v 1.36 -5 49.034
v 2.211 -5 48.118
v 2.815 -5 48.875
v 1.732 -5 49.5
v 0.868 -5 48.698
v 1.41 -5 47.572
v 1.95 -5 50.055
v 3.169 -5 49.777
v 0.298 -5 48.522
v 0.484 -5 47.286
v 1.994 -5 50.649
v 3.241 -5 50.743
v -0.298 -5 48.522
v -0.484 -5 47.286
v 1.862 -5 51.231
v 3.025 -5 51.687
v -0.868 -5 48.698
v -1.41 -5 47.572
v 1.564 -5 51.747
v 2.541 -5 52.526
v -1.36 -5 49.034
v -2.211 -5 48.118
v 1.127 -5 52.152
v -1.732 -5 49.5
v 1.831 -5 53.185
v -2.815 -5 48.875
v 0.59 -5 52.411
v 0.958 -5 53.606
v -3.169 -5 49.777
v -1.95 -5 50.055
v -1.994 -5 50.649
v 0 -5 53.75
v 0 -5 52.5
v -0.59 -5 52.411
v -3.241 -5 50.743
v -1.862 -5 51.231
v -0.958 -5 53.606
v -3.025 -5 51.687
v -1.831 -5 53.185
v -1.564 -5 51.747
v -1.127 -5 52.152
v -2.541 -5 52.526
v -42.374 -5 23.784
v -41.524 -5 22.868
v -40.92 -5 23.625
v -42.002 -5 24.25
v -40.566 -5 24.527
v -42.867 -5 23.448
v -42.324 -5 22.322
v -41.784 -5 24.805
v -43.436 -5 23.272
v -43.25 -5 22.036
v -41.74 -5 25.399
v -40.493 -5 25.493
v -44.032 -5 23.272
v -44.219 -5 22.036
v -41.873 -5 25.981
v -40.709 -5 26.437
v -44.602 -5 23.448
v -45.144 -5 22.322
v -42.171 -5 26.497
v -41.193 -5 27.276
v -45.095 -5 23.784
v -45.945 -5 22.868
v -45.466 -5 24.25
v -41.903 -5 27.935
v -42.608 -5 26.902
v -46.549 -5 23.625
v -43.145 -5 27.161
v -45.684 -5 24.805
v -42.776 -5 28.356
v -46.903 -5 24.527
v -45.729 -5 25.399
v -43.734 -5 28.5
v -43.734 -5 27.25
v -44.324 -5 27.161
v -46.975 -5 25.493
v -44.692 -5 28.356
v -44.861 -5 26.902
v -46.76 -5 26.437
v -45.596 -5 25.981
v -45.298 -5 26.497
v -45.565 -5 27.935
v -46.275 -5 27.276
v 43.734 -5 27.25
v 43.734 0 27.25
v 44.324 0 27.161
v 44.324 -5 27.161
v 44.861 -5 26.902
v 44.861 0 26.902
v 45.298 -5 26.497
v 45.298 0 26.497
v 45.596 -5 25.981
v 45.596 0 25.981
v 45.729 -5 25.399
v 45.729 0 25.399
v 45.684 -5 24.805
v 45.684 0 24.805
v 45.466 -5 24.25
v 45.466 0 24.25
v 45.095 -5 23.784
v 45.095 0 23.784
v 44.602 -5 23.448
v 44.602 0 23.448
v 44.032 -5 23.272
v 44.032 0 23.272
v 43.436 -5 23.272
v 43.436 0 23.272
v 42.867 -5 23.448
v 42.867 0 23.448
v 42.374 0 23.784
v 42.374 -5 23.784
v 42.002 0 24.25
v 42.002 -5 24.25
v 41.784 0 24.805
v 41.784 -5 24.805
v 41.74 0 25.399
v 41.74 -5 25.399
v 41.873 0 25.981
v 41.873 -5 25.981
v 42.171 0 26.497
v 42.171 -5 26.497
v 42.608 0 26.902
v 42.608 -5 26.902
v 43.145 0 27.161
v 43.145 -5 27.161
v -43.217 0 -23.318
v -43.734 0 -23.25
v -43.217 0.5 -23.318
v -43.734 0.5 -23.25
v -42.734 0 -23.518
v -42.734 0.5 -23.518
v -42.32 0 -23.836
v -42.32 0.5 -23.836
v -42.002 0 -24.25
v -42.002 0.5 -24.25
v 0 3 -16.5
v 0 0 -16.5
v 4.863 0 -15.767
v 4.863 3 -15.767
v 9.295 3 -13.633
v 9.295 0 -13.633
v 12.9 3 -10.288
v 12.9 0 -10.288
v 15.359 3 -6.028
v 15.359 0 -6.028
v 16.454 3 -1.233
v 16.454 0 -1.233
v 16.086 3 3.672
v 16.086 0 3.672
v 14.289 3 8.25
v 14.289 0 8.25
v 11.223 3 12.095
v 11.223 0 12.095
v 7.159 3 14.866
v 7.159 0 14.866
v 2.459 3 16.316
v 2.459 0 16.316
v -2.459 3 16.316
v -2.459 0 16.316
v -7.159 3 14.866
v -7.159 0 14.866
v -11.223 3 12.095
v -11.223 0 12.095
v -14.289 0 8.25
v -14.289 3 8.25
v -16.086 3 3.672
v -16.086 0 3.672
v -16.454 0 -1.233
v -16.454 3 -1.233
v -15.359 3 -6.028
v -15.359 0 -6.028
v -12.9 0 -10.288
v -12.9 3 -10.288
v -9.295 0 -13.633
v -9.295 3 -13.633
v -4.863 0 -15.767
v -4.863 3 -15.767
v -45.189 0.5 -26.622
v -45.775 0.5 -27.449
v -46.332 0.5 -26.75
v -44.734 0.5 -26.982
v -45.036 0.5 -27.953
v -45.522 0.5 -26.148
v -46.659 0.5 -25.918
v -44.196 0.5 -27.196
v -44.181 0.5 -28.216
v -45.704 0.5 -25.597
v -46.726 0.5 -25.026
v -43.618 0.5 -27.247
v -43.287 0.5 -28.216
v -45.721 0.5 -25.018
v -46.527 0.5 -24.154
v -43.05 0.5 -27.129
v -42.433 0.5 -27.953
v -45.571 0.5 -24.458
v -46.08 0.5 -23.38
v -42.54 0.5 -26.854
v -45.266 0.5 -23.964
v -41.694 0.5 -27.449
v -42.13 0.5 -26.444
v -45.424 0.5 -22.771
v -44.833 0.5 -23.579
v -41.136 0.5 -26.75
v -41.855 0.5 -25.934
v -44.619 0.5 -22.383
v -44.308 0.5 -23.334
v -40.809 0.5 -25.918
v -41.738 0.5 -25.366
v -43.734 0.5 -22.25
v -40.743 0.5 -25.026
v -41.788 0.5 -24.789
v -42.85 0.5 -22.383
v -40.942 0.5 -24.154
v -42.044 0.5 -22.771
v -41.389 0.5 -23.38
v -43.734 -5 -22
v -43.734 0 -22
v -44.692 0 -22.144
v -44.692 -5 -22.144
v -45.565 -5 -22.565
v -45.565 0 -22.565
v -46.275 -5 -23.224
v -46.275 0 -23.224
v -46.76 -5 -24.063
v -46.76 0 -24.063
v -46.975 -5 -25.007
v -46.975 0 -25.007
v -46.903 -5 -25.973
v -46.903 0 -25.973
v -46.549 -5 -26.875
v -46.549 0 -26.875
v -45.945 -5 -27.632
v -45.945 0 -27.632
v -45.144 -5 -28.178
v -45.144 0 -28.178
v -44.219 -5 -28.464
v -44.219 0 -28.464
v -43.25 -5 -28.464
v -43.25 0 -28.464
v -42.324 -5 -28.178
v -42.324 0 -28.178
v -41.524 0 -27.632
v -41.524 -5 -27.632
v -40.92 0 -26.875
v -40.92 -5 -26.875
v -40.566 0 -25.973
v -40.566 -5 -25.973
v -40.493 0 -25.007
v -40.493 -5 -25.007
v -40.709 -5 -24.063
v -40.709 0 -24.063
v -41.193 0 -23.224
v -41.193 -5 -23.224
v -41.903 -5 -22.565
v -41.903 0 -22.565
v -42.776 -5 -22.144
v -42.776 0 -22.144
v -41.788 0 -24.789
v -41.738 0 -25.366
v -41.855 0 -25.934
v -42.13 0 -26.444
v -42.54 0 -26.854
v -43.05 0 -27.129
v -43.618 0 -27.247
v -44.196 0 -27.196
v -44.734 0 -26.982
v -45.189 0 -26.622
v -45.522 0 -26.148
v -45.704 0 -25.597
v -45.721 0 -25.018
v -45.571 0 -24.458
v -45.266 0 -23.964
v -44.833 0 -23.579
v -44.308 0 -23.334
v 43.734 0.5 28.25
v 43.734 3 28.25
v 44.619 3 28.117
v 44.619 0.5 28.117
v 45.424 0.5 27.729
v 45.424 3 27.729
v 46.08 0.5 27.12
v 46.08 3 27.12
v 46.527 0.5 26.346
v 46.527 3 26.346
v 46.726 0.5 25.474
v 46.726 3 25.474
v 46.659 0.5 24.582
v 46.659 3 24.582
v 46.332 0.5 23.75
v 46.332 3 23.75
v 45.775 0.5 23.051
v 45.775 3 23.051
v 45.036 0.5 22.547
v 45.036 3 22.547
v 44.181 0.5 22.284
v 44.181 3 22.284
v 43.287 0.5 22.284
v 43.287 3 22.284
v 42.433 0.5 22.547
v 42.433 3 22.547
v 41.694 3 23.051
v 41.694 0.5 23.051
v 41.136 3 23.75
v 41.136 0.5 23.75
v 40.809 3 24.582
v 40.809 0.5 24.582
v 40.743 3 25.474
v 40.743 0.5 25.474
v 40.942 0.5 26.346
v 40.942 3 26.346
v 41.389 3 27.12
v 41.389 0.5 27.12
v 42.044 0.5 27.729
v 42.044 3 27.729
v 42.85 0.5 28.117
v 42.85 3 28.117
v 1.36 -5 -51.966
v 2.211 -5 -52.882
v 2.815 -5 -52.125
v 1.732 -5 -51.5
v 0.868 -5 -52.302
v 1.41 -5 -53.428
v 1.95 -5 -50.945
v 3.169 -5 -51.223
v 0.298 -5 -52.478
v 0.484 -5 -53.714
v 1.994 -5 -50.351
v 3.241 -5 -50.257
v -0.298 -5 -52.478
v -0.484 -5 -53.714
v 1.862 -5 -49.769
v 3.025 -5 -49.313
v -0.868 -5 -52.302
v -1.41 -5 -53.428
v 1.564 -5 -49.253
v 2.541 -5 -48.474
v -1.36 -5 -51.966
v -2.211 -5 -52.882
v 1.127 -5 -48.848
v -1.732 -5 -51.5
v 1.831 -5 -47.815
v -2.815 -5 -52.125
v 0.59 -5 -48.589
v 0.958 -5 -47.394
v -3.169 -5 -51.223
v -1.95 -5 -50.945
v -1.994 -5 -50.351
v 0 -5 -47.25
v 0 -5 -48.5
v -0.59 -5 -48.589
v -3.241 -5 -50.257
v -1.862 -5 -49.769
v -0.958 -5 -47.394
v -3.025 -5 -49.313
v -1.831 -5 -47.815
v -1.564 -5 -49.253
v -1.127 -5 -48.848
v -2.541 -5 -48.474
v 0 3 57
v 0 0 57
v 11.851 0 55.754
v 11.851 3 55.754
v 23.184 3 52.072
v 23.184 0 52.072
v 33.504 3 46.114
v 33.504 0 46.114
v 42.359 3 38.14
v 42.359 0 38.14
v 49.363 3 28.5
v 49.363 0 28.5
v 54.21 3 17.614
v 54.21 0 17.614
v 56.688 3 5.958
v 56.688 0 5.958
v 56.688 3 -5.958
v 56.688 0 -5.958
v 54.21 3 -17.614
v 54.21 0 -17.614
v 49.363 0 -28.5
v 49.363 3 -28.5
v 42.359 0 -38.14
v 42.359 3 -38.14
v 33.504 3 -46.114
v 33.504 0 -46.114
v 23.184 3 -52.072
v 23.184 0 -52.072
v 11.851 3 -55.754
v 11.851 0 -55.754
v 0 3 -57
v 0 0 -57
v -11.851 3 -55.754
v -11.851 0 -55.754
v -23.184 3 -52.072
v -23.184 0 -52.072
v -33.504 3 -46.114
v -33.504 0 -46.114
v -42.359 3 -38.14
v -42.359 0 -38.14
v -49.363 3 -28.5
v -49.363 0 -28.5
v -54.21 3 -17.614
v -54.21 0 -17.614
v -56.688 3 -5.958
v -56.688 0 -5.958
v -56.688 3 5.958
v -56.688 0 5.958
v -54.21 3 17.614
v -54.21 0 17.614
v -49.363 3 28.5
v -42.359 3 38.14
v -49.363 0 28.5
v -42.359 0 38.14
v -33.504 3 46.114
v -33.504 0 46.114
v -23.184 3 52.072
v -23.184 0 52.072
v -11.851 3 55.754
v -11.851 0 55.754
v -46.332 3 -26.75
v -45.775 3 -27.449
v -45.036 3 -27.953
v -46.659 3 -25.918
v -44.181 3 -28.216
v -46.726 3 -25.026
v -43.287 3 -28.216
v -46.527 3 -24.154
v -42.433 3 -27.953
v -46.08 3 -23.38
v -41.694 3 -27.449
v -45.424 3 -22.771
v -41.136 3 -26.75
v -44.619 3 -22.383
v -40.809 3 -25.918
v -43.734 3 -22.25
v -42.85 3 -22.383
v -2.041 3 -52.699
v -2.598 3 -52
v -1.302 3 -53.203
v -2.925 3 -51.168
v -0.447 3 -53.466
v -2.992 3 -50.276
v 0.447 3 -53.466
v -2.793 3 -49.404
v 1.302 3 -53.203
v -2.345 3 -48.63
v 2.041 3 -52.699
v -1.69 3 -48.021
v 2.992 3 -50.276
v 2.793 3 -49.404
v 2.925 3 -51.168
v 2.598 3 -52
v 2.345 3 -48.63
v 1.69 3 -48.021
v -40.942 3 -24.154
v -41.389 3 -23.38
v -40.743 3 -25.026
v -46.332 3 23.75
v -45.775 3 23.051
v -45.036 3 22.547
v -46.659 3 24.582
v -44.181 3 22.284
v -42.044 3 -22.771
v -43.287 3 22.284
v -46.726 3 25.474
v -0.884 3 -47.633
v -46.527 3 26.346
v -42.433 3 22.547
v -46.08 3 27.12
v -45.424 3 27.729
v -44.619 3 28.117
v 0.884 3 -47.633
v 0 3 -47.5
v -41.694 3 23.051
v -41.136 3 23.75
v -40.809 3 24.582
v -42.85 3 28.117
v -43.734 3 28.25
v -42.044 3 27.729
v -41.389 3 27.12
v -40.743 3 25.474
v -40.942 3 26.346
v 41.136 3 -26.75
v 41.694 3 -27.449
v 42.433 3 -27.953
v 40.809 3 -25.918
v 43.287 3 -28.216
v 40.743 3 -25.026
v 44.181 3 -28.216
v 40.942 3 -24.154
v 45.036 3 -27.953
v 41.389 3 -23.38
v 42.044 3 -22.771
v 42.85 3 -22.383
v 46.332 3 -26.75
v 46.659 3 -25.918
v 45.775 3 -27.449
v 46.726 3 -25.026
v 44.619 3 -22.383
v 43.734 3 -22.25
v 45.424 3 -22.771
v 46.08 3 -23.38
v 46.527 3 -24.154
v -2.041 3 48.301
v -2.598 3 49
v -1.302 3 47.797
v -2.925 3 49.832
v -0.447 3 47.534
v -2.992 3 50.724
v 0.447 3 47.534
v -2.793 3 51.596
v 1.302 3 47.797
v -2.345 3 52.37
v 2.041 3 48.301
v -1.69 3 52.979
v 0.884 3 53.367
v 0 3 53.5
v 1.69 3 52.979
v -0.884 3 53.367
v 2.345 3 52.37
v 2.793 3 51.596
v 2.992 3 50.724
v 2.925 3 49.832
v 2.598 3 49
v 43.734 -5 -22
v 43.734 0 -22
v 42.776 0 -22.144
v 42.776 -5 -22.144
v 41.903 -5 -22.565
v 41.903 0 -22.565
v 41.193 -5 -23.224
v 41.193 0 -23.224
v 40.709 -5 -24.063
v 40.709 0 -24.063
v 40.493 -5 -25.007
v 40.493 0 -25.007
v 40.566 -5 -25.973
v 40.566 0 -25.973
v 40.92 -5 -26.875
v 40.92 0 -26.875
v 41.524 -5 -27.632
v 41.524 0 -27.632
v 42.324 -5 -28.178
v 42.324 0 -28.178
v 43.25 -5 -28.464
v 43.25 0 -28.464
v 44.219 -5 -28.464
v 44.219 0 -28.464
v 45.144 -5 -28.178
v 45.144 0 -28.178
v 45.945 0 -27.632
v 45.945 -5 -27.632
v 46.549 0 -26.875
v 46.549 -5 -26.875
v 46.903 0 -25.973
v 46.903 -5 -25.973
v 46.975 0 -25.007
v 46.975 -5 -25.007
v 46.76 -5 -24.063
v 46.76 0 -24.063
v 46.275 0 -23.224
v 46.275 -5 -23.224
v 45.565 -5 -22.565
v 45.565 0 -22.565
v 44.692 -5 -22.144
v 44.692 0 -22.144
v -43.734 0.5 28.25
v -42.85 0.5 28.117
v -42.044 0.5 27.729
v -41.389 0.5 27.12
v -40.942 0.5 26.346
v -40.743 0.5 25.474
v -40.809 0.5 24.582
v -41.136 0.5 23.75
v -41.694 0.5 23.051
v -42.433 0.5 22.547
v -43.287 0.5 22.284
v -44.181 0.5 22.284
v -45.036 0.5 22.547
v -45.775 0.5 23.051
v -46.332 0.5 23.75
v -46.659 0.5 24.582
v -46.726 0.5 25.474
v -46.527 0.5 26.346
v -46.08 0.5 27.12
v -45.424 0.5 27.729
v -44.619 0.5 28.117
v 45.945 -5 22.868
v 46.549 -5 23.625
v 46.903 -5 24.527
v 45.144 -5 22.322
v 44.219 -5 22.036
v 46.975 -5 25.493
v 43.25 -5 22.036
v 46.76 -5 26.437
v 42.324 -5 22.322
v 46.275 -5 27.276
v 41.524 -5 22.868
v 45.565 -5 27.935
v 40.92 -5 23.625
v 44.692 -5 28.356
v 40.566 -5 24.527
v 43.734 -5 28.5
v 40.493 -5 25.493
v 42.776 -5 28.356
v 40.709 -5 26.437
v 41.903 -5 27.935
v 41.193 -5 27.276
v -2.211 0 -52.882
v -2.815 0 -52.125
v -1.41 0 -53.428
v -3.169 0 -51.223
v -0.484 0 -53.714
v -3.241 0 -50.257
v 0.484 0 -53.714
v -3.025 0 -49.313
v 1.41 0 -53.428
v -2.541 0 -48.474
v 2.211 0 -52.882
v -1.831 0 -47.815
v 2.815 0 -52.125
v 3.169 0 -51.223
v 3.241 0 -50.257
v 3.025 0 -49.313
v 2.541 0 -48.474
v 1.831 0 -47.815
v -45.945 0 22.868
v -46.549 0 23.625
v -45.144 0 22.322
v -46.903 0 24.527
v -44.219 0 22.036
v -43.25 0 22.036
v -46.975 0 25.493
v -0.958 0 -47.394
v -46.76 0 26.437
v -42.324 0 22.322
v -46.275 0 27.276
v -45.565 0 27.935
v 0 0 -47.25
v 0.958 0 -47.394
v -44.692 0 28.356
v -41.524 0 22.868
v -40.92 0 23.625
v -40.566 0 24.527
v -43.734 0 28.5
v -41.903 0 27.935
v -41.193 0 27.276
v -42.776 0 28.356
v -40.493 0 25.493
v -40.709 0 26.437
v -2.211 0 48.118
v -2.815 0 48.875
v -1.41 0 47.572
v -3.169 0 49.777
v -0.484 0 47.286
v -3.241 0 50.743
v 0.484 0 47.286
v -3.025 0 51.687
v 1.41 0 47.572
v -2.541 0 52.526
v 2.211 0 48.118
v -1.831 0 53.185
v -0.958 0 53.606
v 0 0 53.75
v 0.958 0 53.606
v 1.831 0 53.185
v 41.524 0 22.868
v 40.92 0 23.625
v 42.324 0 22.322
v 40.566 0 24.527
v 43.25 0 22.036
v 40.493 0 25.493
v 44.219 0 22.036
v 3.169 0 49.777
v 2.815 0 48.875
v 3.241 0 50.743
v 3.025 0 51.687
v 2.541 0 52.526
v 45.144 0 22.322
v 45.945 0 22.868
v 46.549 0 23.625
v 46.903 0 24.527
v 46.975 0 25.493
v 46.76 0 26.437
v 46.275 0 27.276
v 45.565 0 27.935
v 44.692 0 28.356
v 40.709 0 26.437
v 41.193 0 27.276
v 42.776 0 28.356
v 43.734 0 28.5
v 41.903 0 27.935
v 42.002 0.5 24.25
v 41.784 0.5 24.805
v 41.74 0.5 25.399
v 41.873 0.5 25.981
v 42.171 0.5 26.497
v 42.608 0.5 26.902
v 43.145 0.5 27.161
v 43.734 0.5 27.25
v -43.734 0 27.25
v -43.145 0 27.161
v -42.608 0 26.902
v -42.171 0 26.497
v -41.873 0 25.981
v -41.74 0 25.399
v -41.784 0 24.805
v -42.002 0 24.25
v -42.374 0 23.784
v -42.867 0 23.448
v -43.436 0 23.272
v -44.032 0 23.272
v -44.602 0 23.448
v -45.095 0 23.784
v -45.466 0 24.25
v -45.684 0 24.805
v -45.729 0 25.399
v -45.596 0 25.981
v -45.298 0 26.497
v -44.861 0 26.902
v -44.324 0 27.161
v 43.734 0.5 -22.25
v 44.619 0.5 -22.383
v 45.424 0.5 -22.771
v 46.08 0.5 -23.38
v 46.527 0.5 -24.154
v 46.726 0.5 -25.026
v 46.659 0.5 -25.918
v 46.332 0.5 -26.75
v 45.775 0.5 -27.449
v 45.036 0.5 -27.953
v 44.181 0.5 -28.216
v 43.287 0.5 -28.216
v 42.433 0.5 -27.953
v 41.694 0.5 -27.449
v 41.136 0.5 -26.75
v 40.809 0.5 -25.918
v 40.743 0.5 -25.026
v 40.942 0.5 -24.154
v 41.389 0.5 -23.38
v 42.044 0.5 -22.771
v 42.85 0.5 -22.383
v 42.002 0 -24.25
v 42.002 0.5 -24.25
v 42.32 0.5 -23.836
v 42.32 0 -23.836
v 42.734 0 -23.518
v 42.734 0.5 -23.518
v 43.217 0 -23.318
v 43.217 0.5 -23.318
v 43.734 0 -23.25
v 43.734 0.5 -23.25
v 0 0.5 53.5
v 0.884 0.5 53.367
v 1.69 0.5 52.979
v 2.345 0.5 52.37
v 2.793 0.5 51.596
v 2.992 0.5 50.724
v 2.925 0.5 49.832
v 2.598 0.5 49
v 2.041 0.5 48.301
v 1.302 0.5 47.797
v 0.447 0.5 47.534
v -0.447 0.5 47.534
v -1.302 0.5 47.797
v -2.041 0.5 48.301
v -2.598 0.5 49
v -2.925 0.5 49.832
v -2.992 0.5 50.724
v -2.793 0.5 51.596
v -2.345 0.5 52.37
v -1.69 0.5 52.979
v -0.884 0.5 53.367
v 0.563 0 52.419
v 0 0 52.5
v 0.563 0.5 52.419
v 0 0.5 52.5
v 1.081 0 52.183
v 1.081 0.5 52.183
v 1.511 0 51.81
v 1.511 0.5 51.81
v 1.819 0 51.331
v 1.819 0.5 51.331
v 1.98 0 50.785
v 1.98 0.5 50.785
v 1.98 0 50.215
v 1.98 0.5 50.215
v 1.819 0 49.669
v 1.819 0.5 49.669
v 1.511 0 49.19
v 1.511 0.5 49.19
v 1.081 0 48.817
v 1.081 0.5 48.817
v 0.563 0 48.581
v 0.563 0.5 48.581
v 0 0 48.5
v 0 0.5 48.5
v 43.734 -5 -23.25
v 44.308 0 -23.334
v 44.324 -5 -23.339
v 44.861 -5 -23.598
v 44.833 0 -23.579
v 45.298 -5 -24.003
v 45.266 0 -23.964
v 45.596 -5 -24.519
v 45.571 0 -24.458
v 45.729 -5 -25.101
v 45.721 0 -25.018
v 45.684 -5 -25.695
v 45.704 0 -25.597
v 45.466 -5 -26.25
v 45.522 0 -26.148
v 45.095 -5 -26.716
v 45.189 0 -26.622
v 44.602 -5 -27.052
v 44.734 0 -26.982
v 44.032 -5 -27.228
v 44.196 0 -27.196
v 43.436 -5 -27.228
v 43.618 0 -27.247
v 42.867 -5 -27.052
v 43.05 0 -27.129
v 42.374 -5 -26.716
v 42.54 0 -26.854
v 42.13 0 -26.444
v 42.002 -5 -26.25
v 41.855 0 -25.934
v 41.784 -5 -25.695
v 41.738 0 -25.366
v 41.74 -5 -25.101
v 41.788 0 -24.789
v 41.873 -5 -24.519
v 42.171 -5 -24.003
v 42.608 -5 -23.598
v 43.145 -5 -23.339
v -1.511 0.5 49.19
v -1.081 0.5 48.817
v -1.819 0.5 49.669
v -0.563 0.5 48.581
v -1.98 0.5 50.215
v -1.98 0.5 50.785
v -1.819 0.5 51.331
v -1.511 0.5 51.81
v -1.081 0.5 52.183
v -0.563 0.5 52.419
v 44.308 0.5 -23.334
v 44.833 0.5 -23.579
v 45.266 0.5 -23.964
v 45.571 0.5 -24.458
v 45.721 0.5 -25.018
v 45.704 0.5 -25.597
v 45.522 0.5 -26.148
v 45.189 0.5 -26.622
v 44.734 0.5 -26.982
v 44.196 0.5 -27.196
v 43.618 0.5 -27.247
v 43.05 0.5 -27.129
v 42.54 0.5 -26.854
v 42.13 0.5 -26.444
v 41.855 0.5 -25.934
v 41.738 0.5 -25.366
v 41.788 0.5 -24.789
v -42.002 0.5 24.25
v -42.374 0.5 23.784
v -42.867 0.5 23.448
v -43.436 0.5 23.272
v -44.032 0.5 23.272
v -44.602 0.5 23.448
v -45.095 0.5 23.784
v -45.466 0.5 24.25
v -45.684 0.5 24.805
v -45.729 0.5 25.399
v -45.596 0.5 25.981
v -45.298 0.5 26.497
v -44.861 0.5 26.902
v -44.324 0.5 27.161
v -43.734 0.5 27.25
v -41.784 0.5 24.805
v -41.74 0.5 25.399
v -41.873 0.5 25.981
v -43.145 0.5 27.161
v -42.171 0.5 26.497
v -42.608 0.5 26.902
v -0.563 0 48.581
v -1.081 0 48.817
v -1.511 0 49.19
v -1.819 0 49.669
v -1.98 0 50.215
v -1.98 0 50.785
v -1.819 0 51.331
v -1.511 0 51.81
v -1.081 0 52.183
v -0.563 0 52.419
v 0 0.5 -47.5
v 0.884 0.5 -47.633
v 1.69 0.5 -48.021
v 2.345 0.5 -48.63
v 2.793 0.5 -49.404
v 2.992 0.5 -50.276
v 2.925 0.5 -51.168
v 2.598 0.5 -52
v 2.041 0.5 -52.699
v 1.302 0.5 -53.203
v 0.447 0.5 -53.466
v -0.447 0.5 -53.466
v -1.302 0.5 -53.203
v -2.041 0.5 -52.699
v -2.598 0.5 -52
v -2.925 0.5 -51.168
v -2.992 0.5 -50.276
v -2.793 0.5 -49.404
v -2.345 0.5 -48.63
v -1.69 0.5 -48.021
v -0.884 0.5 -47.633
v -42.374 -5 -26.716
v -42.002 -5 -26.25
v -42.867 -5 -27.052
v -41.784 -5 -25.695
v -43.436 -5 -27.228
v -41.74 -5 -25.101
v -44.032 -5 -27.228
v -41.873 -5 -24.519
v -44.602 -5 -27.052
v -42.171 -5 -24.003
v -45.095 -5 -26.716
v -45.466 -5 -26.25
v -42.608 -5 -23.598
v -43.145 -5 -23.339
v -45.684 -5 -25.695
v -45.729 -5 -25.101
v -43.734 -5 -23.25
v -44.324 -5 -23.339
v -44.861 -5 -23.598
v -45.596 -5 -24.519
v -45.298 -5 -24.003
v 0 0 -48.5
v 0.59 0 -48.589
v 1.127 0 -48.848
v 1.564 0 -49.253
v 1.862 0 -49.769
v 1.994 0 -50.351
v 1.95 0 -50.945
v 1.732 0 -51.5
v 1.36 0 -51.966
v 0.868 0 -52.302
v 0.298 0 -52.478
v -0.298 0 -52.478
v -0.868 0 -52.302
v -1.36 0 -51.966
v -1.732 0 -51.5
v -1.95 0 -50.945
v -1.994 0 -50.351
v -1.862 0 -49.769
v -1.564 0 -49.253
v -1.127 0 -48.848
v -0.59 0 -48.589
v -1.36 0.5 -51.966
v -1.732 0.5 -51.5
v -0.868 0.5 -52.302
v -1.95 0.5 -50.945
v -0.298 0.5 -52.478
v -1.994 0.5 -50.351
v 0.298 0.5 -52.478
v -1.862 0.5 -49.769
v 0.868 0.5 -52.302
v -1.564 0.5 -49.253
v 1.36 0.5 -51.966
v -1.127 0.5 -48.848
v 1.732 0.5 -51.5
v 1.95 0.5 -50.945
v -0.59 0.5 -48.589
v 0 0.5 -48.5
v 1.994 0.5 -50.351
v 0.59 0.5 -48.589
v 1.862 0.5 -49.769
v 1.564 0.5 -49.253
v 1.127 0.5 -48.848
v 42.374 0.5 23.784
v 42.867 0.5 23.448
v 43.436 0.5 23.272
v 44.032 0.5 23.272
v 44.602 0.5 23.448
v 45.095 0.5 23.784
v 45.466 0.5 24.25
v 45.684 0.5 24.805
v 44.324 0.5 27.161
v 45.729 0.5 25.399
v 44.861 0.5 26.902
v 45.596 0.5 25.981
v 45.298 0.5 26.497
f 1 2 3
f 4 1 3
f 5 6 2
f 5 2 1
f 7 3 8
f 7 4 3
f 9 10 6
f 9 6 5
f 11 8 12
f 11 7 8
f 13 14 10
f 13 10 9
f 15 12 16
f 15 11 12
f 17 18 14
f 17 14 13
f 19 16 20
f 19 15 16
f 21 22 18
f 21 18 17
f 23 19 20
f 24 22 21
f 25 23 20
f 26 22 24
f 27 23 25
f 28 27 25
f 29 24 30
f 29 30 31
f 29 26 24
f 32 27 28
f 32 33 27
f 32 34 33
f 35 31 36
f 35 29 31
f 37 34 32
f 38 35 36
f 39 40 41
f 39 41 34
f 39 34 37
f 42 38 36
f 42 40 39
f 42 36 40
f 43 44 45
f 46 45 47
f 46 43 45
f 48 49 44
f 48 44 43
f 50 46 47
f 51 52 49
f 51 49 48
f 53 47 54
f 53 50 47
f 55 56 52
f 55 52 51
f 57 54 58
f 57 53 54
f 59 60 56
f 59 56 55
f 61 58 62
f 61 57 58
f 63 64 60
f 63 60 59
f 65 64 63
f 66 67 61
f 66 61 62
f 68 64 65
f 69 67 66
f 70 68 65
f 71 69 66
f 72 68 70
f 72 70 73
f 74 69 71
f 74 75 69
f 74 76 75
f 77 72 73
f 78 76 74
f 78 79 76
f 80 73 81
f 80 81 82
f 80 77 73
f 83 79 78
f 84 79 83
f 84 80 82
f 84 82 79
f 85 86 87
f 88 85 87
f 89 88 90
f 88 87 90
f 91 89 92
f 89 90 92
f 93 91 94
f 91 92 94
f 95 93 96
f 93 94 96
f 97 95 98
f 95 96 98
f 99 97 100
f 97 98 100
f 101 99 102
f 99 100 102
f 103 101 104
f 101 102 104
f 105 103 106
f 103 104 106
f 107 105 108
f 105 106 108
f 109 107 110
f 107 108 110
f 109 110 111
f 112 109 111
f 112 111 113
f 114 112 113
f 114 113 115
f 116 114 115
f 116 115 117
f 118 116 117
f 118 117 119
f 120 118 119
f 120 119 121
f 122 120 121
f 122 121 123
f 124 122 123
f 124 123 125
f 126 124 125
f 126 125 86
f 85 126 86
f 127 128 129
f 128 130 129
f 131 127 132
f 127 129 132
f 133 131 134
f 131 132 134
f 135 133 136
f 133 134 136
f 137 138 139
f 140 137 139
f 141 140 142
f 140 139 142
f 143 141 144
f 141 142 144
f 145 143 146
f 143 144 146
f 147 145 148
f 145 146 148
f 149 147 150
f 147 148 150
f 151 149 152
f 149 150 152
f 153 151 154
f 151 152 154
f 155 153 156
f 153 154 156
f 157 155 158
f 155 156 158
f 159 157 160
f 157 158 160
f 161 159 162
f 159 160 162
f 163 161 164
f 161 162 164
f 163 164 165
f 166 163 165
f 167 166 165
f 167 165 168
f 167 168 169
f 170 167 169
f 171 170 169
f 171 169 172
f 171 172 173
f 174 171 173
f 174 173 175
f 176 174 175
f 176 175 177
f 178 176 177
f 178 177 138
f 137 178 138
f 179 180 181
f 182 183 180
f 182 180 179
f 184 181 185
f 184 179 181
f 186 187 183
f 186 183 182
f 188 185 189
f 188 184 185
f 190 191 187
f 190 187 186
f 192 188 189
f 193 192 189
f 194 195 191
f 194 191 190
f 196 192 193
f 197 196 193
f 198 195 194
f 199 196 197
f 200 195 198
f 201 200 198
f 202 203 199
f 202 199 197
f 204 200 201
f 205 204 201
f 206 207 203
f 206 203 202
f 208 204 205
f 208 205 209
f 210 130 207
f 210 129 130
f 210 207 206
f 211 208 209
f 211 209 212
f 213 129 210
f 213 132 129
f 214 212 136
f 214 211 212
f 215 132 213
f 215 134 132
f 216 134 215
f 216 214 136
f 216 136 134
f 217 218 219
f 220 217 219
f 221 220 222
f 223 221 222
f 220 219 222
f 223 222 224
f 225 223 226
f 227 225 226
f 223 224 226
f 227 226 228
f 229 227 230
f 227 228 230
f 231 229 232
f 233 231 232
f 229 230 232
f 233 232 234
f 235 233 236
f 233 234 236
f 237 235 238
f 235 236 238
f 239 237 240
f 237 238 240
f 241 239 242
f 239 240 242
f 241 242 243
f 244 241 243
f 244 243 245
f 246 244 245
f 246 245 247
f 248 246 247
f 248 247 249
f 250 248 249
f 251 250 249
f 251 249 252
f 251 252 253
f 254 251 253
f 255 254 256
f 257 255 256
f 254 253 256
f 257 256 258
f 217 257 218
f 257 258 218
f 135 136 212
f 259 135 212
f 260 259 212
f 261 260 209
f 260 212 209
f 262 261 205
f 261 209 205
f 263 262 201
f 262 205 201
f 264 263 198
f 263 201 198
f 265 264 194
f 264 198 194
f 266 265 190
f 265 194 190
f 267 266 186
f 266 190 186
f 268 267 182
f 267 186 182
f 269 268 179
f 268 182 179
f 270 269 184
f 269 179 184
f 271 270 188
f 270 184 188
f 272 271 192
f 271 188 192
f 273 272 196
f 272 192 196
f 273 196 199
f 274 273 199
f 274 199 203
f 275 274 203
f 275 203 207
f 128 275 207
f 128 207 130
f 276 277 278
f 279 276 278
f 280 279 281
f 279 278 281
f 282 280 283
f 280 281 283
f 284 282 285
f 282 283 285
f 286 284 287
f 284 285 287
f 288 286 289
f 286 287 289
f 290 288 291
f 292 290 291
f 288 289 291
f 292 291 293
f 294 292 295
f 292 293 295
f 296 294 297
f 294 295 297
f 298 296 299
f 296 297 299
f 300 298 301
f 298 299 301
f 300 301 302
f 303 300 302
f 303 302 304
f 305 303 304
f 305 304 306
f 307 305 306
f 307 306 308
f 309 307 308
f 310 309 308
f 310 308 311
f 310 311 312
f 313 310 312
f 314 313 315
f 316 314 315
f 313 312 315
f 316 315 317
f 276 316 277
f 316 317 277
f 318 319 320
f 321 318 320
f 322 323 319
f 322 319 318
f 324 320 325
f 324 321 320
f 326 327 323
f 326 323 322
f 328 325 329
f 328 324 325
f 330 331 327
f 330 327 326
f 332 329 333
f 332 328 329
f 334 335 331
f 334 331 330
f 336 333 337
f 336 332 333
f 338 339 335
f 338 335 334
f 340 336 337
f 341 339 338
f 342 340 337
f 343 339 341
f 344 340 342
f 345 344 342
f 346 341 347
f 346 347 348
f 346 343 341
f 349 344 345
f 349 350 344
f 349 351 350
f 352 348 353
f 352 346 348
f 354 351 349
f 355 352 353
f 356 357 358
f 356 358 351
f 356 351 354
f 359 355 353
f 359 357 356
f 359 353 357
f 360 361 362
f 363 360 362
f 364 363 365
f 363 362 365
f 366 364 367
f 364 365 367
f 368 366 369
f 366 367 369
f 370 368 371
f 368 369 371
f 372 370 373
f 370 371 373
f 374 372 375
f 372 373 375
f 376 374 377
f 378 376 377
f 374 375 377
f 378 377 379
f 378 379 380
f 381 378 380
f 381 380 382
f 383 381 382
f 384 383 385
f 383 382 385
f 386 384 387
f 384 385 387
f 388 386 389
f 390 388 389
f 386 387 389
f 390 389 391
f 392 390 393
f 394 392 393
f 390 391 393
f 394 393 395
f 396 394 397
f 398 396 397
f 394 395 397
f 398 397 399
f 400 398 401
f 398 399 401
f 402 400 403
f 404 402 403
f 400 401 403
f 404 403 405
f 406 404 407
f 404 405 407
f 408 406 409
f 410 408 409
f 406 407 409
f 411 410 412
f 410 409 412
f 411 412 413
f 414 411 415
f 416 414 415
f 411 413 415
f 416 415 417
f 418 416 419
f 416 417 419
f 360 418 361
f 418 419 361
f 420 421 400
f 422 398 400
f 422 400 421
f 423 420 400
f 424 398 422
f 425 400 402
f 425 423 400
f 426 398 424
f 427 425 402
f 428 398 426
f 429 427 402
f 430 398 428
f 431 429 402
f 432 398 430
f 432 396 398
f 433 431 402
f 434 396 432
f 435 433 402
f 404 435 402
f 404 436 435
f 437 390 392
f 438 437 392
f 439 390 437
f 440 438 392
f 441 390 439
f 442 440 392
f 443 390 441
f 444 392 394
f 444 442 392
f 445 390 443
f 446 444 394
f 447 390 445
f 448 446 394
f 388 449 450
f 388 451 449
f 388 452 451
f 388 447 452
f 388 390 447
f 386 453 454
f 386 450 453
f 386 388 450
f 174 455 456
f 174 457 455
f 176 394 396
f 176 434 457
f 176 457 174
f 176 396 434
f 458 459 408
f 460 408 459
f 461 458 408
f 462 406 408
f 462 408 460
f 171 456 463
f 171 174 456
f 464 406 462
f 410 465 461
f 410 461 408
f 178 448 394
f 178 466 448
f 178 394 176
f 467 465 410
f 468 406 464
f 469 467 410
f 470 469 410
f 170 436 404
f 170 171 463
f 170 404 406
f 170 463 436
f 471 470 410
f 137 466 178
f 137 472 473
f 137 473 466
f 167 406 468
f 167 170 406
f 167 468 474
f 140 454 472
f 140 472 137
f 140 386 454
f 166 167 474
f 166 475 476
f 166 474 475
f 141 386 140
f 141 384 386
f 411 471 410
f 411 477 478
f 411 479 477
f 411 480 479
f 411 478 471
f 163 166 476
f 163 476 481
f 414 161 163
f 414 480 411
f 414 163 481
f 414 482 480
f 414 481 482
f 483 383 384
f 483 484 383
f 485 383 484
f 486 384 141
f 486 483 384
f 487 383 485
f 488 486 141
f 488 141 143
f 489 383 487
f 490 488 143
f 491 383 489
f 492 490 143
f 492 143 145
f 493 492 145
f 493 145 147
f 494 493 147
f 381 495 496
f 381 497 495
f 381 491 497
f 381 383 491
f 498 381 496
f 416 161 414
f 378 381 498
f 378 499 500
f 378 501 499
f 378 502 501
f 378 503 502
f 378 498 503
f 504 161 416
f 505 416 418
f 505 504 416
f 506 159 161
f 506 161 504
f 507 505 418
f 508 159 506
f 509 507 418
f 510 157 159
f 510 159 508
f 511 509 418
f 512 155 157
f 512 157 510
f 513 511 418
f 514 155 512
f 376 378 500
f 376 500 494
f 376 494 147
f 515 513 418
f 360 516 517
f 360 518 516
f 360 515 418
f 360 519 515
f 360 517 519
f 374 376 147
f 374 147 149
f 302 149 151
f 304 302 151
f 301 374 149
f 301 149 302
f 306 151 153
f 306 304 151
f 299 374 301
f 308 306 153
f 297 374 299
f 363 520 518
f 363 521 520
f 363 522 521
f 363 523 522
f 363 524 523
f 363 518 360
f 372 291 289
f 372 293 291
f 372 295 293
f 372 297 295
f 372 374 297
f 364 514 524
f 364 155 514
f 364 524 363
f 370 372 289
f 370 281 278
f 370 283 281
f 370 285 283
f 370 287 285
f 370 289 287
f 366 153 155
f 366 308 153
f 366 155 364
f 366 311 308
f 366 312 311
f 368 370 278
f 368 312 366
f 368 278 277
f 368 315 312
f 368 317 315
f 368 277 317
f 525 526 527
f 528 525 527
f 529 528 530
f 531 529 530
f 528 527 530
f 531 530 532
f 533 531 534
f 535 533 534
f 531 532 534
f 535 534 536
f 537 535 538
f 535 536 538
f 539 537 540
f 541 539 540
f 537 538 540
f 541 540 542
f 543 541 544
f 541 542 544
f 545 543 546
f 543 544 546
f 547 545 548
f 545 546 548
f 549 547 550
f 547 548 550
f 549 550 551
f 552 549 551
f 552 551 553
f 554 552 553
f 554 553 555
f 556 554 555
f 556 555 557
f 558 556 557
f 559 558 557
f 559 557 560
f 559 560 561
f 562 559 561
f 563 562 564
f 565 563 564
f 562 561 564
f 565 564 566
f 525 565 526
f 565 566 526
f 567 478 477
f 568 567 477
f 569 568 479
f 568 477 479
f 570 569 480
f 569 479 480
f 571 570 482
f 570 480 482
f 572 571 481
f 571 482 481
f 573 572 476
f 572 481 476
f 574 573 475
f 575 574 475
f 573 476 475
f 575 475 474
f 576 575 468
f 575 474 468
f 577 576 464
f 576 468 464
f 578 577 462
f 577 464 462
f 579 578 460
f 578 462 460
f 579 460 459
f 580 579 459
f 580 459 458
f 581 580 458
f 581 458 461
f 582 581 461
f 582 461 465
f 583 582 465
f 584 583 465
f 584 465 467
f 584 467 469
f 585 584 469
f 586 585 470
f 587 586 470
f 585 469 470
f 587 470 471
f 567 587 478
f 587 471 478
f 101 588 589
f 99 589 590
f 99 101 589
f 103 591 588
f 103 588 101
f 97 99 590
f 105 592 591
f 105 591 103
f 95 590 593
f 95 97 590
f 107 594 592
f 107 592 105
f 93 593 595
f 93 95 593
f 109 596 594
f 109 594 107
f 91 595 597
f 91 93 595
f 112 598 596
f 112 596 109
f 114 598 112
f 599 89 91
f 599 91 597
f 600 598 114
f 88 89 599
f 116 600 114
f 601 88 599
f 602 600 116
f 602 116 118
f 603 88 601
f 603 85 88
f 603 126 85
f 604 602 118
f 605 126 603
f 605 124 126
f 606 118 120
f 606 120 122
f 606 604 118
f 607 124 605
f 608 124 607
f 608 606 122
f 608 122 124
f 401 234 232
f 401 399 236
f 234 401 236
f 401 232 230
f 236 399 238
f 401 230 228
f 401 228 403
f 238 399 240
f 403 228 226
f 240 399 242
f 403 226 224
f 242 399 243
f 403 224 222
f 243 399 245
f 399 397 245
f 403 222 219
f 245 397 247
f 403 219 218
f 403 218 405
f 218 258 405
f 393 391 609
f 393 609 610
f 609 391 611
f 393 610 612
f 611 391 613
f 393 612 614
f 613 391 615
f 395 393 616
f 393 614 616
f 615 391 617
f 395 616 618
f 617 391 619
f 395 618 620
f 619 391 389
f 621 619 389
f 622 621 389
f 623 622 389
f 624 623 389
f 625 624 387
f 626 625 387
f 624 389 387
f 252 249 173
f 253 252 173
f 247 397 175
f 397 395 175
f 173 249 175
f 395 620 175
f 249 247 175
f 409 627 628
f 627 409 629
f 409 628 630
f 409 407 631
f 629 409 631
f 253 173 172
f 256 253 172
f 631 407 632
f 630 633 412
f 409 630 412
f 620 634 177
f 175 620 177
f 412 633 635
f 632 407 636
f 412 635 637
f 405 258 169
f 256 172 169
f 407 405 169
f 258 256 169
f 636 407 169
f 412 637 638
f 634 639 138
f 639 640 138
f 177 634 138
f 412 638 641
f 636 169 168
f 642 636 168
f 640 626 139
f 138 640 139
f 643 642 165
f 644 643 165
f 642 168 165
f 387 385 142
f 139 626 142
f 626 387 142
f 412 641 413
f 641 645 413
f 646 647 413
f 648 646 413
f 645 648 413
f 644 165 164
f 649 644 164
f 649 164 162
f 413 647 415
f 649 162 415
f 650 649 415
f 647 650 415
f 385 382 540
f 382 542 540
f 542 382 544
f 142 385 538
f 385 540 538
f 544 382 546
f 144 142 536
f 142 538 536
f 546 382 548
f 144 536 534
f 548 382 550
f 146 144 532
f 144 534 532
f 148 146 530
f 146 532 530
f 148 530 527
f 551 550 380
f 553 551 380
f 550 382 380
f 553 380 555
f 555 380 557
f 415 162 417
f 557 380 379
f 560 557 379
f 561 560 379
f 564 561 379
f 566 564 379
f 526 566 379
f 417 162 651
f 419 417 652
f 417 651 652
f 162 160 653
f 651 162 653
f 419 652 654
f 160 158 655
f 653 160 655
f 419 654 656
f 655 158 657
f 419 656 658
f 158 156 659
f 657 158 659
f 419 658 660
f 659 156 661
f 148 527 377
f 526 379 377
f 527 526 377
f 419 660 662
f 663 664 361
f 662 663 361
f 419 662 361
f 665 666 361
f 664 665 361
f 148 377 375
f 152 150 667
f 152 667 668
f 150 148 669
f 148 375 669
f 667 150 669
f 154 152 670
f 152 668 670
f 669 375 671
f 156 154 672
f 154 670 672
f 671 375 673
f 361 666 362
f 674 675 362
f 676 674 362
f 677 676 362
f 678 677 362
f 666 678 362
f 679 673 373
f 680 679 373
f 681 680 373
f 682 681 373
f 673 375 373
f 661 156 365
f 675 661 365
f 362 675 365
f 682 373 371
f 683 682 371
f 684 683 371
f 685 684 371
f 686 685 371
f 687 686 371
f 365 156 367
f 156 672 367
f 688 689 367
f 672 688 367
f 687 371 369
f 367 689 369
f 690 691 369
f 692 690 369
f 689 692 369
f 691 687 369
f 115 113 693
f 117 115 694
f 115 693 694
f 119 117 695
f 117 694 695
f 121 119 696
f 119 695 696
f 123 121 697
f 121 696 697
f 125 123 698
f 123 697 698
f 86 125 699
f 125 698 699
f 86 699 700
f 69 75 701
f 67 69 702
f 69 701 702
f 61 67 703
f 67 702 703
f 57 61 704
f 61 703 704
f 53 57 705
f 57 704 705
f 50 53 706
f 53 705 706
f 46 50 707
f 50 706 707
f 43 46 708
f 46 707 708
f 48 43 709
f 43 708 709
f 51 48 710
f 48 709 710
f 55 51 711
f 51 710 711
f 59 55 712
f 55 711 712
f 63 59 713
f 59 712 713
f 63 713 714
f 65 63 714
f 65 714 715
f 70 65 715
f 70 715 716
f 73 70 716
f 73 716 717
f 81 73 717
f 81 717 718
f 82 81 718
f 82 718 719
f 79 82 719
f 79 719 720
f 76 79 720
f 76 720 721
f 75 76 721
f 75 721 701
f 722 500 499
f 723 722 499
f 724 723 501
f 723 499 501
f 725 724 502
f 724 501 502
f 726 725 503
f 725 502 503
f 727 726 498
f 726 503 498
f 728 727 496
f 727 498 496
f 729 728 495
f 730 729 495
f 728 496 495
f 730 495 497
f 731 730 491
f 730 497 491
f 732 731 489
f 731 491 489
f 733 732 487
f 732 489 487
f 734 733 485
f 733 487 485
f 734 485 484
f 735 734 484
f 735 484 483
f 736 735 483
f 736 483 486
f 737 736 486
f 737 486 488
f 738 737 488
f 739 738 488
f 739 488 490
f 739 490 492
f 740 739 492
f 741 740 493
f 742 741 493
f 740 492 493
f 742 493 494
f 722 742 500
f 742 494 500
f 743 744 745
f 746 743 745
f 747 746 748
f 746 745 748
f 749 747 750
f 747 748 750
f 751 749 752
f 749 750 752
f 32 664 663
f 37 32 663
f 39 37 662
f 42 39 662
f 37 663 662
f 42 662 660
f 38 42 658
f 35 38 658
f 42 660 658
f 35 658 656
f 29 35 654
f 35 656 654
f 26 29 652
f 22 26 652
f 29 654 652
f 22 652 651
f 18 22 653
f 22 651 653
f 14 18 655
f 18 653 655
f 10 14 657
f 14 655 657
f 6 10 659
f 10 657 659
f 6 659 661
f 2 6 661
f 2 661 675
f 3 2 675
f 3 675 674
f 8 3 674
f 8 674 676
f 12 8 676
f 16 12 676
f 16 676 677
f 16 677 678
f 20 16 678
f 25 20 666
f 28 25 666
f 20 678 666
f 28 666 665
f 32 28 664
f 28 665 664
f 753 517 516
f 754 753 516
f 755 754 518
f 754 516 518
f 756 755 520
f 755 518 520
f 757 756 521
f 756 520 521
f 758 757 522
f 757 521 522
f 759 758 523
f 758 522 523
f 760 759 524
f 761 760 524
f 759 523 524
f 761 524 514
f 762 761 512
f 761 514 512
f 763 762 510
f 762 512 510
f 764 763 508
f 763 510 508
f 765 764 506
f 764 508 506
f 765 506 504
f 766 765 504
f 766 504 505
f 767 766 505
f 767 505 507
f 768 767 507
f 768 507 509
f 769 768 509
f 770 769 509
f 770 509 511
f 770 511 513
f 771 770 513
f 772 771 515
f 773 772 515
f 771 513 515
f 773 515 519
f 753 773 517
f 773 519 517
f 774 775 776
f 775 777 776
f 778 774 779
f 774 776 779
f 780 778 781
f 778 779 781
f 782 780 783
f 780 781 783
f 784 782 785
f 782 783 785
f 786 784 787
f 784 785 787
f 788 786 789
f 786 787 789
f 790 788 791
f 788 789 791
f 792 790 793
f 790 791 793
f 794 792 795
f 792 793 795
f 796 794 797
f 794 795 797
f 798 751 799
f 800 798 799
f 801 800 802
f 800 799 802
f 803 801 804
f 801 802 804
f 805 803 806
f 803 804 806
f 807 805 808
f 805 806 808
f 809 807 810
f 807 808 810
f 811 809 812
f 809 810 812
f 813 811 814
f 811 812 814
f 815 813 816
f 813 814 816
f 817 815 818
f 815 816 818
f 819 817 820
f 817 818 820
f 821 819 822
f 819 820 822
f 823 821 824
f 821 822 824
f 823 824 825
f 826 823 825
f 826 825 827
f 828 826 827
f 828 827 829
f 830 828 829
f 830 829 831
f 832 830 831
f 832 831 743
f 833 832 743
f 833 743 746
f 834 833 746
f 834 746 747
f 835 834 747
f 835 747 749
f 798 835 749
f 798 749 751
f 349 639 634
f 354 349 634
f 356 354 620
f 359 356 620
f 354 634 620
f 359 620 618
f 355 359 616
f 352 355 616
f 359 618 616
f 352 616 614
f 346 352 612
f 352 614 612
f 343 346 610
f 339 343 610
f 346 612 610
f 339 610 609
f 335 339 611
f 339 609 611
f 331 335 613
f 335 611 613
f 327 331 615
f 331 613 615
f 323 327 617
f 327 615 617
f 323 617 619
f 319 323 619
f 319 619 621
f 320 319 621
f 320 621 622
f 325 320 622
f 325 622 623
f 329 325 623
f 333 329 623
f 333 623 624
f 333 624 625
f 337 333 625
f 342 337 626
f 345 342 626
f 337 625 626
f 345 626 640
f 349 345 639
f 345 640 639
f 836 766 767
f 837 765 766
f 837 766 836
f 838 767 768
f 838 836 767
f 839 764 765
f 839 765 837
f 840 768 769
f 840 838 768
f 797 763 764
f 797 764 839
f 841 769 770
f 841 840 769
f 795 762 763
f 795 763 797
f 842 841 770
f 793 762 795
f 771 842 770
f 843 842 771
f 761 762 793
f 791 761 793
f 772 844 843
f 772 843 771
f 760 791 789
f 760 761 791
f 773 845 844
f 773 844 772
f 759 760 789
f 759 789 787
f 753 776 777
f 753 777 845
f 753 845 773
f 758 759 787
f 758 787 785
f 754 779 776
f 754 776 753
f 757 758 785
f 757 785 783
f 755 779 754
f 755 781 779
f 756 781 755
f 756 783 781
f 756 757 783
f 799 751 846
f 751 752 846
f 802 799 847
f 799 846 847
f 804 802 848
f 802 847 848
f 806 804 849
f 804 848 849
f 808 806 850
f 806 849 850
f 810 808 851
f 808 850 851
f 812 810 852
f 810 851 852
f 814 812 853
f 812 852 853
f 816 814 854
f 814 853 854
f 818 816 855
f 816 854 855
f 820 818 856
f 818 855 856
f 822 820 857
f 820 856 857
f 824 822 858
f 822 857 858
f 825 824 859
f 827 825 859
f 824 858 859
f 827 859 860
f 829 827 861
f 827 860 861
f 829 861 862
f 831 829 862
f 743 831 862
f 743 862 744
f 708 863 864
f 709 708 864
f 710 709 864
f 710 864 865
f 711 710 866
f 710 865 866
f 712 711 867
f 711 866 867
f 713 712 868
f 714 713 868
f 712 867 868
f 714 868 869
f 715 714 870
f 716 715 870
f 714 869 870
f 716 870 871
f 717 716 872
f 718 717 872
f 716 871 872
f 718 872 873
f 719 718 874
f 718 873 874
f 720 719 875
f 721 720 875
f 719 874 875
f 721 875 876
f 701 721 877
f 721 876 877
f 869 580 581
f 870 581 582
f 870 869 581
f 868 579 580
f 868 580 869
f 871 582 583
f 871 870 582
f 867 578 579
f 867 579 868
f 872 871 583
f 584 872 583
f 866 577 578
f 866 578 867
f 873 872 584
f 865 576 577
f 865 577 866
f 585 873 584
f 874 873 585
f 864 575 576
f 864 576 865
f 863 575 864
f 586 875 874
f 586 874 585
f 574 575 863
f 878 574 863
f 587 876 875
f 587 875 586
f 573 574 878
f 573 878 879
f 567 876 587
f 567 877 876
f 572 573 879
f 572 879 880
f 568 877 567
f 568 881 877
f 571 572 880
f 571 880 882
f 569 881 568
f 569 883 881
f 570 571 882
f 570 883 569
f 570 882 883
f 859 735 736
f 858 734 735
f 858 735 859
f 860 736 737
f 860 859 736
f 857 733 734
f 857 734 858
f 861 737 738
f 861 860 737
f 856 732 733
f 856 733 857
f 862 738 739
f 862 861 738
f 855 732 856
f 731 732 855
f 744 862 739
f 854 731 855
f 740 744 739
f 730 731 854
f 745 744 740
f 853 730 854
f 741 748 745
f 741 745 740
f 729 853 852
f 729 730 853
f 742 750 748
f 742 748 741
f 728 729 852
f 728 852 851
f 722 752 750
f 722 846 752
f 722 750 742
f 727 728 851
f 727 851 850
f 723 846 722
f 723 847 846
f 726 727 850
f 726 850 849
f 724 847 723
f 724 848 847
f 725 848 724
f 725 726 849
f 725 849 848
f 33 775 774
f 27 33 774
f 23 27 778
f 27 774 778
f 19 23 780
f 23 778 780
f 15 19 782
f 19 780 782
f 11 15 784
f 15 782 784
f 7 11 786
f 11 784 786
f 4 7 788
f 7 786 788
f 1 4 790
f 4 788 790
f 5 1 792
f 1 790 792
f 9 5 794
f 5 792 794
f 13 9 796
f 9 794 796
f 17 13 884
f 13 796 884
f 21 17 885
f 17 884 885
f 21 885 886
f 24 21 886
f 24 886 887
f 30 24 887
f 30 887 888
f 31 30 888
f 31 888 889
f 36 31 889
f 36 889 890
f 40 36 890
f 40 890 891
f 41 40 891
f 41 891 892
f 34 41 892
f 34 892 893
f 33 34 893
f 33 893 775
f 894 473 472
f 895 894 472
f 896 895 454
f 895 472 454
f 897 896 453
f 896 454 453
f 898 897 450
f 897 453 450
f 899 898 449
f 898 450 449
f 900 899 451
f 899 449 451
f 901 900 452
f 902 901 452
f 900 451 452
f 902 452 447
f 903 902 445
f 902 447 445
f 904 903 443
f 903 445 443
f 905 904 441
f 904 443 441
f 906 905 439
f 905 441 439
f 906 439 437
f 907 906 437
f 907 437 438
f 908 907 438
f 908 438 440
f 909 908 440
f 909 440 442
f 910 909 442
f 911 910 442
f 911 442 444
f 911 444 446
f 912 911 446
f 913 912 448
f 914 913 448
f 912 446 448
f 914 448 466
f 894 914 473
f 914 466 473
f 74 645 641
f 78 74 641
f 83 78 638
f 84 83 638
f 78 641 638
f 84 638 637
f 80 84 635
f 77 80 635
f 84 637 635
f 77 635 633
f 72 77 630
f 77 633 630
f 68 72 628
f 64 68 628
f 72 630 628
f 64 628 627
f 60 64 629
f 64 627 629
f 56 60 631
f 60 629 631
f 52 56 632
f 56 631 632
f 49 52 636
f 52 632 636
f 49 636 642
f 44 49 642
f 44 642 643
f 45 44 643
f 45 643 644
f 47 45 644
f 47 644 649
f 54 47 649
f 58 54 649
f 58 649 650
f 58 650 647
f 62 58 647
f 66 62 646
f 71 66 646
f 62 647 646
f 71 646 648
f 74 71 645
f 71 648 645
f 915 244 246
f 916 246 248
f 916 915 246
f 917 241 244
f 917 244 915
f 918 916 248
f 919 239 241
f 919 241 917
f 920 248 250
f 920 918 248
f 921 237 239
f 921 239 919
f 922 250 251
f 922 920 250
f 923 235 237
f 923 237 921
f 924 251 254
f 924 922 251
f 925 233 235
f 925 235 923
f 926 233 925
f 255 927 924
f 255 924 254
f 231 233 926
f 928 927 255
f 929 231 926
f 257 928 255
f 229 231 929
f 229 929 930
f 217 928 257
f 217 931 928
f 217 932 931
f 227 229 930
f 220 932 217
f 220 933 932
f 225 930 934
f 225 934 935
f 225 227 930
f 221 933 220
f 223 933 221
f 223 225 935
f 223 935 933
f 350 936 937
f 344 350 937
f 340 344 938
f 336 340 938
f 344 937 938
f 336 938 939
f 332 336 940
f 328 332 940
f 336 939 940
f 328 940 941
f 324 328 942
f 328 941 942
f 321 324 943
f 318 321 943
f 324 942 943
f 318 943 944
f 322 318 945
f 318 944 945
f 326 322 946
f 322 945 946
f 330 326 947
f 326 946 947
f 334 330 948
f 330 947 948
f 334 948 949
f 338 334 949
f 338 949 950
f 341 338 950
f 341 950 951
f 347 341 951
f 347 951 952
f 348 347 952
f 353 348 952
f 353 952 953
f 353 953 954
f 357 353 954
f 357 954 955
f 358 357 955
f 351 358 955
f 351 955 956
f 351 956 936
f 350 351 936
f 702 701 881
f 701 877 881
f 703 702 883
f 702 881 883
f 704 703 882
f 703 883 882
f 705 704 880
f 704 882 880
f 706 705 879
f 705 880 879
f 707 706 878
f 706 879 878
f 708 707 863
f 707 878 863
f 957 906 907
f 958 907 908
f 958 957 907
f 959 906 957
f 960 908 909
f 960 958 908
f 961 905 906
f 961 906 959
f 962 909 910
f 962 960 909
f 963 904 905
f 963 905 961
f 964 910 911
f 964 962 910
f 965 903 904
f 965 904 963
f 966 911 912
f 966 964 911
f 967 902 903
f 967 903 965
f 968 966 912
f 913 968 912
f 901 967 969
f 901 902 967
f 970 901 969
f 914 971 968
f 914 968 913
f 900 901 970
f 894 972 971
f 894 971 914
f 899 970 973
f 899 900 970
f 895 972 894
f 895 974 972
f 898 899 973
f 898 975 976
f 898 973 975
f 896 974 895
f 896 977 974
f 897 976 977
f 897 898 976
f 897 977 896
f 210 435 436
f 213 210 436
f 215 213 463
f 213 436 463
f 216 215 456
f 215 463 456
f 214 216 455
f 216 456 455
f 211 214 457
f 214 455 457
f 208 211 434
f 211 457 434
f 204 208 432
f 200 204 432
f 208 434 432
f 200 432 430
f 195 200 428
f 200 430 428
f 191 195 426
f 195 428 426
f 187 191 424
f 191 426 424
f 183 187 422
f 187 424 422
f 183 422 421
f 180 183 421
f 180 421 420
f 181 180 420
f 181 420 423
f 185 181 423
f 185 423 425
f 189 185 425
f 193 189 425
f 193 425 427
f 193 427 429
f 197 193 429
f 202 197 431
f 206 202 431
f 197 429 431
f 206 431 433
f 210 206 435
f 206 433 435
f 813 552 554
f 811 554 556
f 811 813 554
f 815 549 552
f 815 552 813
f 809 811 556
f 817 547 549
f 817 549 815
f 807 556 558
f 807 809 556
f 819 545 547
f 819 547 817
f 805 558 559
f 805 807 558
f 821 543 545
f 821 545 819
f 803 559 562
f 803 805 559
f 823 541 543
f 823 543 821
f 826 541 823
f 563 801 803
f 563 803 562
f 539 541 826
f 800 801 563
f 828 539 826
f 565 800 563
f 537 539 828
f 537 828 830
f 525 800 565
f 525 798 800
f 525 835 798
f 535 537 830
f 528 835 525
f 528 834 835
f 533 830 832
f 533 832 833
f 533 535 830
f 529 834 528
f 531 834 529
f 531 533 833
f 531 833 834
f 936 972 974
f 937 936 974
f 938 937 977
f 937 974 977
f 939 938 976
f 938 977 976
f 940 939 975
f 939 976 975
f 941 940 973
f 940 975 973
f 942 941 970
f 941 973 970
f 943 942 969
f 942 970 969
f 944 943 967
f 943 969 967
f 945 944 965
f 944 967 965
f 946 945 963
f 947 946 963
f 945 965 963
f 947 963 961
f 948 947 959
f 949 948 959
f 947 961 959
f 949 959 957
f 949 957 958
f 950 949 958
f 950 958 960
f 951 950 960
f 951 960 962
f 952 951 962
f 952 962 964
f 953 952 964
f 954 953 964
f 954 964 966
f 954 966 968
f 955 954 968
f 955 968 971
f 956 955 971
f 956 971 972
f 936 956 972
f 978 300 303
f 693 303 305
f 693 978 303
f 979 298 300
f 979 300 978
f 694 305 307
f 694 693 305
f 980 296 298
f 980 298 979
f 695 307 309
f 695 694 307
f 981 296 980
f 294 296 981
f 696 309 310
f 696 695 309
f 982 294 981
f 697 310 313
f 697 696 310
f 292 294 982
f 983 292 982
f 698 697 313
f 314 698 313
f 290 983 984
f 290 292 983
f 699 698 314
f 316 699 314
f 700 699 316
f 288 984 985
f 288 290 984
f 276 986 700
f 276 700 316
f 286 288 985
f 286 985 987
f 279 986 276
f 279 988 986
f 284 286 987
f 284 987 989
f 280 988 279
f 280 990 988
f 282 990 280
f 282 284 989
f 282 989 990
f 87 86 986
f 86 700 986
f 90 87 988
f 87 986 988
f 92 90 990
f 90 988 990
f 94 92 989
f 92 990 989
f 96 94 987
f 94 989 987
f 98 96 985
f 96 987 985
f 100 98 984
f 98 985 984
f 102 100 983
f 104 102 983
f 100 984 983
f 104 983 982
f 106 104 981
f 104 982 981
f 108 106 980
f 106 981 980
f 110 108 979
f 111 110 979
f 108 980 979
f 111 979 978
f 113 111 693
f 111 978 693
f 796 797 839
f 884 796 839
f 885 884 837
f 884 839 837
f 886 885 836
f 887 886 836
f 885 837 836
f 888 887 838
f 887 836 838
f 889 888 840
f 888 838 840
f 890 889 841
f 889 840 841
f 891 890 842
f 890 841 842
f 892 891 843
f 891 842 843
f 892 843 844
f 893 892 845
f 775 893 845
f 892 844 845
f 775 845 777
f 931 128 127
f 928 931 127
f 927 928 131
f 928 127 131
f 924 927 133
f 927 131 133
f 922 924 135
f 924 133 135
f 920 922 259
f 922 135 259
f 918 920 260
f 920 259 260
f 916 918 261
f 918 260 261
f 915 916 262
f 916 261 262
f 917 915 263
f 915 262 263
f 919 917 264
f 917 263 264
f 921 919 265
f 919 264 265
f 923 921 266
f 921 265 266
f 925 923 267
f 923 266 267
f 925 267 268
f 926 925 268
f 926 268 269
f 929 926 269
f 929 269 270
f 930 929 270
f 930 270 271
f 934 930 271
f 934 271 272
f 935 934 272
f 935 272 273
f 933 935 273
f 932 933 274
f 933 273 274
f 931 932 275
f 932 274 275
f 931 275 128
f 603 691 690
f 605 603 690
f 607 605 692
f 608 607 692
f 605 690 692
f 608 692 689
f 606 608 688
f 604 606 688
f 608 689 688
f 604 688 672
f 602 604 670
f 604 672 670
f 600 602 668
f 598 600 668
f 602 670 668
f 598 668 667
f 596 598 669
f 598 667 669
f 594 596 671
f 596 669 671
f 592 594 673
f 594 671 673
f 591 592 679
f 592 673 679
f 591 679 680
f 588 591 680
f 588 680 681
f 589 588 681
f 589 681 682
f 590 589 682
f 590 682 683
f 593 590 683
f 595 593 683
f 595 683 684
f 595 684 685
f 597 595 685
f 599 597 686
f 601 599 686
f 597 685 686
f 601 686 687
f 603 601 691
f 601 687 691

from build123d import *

# Parameters (mm, degrees)
SKETCH1_R           = 57
BOSS_EXTRUDE1_DEPTH = 3
SKETCH2_R           = 2
CUT_EXTRUDE1_DEPTH  = 81.665977958
CIRPATTERN1_COUNT   = 6
SKETCH5_R           = 3.25
BOSS_EXTRUDE2_DEPTH = 5
SKETCH4_R           = 16.5
CUT_EXTRUDE3_DEPTH  = 81.765091469
SKETCH8_R           = 2
CUT_EXTRUDE4_DEPTH  = 82.006172604
SKETCH9_R           = 3
CUT_EXTRUDE5_DEPTH  = 2.5


with BuildPart() as part:
    # Sketch1 → Boss-Extrude1 (new body)
    with BuildSketch(Plane(origin=(0, 0, 0), x_dir=(1, 0, 0), z_dir=(0, 1, 0))):
        with Locations(Location((0, 0, 0), (0, 0, 270))):
            Circle(SKETCH1_R)
    extrude(amount=BOSS_EXTRUDE1_DEPTH)

    # Sketch2 → Cut-Extrude1 (cut, through all)
    with BuildSketch(Plane(origin=(0, 3, 0), x_dir=(1, 0, 0), z_dir=(0, 1, 0))):
        with Locations(Location((0, 50.5, 0), (0, 0, 270))):
            Circle(SKETCH2_R)
    cut_extrude1 = extrude(amount=-CUT_EXTRUDE1_DEPTH, mode=Mode.SUBTRACT)

    # CirPattern1: Cut-Extrude1 ×6 about axis
    cirpattern1_axis = Axis((0, 0, 0), (0, 1, 0))
    for i in range(1, CIRPATTERN1_COUNT):
        add(cut_extrude1.rotate(cirpattern1_axis, i * 360 / CIRPATTERN1_COUNT), mode=Mode.SUBTRACT)

    # Sketch5 → Boss-Extrude2 (add)
    with BuildSketch(Plane.XZ):
        with Locations(Location((0, 50.5, 0), (0, 0, 90))):
            Circle(SKETCH5_R)
        with Locations(Location((43.734282891, 25.25, 0), (0, 0, 90))):
            Circle(SKETCH5_R)
        with Locations(Location((43.734282891, -25.25, 0), (0, 0, 90))):
            Circle(SKETCH5_R)
        with Locations(Location((0, -50.5, 0), (0, 0, 90))):
            Circle(SKETCH5_R)
        with Locations(Location((-43.734282891, -25.25, 0), (0, 0, 90))):
            Circle(SKETCH5_R)
        with Locations(Location((-43.734282891, 25.25, 0), (0, 0, 90))):
            Circle(SKETCH5_R)
    extrude(amount=BOSS_EXTRUDE2_DEPTH)

    # Sketch4 → Cut-Extrude3 (cut, through all)
    with BuildSketch(Plane.XZ):
        with Locations(Location((0, 0, 0), (0, 0, 270))):
            Circle(SKETCH4_R)
    extrude(amount=-CUT_EXTRUDE3_DEPTH, mode=Mode.SUBTRACT)

    # Sketch8 → Cut-Extrude4 (cut, through all)
    with BuildSketch(Plane(origin=(0, 3, 0), x_dir=(1, 0, 0), z_dir=(0, 1, 0))):
        with Locations(Location((-43.734282891, -25.25, 0), (0, 0, 270))):
            Circle(SKETCH8_R)
        with Locations(Location((0, -50.5, 0), (0, 0, 270))):
            Circle(SKETCH8_R)
        with Locations(Location((43.734282891, -25.25, 0), (0, 0, 270))):
            Circle(SKETCH8_R)
        with Locations(Location((43.734282891, 25.25, 0), (0, 0, 270))):
            Circle(SKETCH8_R)
        with Locations(Location((0, 50.5, 0), (0, 0, 270))):
            Circle(SKETCH8_R)
        with Locations(Location((-43.734282891, 25.25, 0), (0, 0, 270))):
            Circle(SKETCH8_R)
    extrude(amount=-CUT_EXTRUDE4_DEPTH, mode=Mode.SUBTRACT)

    # Sketch9 → Cut-Extrude5 (cut)
    with BuildSketch(Plane(origin=(0, 3, 0), x_dir=(1, 0, 0), z_dir=(0, 1, 0))):
        with Locations(Location((-43.734282891, 25.25, 0), (0, 0, 270))):
            Circle(SKETCH9_R)
        with Locations(Location((0, 50.5, 0), (0, 0, 270))):
            Circle(SKETCH9_R)
        with Locations(Location((43.734282891, 25.25, 0), (0, 0, 270))):
            Circle(SKETCH9_R)
        with Locations(Location((43.734282891, -25.25, 0), (0, 0, 270))):
            Circle(SKETCH9_R)
        with Locations(Location((0, -50.5, 0), (0, 0, 270))):
            Circle(SKETCH9_R)
        with Locations(Location((-43.734282891, -25.25, 0), (0, 0, 270))):
            Circle(SKETCH9_R)
    extrude(amount=-CUT_EXTRUDE5_DEPTH, mode=Mode.SUBTRACT)


solid = part.part
